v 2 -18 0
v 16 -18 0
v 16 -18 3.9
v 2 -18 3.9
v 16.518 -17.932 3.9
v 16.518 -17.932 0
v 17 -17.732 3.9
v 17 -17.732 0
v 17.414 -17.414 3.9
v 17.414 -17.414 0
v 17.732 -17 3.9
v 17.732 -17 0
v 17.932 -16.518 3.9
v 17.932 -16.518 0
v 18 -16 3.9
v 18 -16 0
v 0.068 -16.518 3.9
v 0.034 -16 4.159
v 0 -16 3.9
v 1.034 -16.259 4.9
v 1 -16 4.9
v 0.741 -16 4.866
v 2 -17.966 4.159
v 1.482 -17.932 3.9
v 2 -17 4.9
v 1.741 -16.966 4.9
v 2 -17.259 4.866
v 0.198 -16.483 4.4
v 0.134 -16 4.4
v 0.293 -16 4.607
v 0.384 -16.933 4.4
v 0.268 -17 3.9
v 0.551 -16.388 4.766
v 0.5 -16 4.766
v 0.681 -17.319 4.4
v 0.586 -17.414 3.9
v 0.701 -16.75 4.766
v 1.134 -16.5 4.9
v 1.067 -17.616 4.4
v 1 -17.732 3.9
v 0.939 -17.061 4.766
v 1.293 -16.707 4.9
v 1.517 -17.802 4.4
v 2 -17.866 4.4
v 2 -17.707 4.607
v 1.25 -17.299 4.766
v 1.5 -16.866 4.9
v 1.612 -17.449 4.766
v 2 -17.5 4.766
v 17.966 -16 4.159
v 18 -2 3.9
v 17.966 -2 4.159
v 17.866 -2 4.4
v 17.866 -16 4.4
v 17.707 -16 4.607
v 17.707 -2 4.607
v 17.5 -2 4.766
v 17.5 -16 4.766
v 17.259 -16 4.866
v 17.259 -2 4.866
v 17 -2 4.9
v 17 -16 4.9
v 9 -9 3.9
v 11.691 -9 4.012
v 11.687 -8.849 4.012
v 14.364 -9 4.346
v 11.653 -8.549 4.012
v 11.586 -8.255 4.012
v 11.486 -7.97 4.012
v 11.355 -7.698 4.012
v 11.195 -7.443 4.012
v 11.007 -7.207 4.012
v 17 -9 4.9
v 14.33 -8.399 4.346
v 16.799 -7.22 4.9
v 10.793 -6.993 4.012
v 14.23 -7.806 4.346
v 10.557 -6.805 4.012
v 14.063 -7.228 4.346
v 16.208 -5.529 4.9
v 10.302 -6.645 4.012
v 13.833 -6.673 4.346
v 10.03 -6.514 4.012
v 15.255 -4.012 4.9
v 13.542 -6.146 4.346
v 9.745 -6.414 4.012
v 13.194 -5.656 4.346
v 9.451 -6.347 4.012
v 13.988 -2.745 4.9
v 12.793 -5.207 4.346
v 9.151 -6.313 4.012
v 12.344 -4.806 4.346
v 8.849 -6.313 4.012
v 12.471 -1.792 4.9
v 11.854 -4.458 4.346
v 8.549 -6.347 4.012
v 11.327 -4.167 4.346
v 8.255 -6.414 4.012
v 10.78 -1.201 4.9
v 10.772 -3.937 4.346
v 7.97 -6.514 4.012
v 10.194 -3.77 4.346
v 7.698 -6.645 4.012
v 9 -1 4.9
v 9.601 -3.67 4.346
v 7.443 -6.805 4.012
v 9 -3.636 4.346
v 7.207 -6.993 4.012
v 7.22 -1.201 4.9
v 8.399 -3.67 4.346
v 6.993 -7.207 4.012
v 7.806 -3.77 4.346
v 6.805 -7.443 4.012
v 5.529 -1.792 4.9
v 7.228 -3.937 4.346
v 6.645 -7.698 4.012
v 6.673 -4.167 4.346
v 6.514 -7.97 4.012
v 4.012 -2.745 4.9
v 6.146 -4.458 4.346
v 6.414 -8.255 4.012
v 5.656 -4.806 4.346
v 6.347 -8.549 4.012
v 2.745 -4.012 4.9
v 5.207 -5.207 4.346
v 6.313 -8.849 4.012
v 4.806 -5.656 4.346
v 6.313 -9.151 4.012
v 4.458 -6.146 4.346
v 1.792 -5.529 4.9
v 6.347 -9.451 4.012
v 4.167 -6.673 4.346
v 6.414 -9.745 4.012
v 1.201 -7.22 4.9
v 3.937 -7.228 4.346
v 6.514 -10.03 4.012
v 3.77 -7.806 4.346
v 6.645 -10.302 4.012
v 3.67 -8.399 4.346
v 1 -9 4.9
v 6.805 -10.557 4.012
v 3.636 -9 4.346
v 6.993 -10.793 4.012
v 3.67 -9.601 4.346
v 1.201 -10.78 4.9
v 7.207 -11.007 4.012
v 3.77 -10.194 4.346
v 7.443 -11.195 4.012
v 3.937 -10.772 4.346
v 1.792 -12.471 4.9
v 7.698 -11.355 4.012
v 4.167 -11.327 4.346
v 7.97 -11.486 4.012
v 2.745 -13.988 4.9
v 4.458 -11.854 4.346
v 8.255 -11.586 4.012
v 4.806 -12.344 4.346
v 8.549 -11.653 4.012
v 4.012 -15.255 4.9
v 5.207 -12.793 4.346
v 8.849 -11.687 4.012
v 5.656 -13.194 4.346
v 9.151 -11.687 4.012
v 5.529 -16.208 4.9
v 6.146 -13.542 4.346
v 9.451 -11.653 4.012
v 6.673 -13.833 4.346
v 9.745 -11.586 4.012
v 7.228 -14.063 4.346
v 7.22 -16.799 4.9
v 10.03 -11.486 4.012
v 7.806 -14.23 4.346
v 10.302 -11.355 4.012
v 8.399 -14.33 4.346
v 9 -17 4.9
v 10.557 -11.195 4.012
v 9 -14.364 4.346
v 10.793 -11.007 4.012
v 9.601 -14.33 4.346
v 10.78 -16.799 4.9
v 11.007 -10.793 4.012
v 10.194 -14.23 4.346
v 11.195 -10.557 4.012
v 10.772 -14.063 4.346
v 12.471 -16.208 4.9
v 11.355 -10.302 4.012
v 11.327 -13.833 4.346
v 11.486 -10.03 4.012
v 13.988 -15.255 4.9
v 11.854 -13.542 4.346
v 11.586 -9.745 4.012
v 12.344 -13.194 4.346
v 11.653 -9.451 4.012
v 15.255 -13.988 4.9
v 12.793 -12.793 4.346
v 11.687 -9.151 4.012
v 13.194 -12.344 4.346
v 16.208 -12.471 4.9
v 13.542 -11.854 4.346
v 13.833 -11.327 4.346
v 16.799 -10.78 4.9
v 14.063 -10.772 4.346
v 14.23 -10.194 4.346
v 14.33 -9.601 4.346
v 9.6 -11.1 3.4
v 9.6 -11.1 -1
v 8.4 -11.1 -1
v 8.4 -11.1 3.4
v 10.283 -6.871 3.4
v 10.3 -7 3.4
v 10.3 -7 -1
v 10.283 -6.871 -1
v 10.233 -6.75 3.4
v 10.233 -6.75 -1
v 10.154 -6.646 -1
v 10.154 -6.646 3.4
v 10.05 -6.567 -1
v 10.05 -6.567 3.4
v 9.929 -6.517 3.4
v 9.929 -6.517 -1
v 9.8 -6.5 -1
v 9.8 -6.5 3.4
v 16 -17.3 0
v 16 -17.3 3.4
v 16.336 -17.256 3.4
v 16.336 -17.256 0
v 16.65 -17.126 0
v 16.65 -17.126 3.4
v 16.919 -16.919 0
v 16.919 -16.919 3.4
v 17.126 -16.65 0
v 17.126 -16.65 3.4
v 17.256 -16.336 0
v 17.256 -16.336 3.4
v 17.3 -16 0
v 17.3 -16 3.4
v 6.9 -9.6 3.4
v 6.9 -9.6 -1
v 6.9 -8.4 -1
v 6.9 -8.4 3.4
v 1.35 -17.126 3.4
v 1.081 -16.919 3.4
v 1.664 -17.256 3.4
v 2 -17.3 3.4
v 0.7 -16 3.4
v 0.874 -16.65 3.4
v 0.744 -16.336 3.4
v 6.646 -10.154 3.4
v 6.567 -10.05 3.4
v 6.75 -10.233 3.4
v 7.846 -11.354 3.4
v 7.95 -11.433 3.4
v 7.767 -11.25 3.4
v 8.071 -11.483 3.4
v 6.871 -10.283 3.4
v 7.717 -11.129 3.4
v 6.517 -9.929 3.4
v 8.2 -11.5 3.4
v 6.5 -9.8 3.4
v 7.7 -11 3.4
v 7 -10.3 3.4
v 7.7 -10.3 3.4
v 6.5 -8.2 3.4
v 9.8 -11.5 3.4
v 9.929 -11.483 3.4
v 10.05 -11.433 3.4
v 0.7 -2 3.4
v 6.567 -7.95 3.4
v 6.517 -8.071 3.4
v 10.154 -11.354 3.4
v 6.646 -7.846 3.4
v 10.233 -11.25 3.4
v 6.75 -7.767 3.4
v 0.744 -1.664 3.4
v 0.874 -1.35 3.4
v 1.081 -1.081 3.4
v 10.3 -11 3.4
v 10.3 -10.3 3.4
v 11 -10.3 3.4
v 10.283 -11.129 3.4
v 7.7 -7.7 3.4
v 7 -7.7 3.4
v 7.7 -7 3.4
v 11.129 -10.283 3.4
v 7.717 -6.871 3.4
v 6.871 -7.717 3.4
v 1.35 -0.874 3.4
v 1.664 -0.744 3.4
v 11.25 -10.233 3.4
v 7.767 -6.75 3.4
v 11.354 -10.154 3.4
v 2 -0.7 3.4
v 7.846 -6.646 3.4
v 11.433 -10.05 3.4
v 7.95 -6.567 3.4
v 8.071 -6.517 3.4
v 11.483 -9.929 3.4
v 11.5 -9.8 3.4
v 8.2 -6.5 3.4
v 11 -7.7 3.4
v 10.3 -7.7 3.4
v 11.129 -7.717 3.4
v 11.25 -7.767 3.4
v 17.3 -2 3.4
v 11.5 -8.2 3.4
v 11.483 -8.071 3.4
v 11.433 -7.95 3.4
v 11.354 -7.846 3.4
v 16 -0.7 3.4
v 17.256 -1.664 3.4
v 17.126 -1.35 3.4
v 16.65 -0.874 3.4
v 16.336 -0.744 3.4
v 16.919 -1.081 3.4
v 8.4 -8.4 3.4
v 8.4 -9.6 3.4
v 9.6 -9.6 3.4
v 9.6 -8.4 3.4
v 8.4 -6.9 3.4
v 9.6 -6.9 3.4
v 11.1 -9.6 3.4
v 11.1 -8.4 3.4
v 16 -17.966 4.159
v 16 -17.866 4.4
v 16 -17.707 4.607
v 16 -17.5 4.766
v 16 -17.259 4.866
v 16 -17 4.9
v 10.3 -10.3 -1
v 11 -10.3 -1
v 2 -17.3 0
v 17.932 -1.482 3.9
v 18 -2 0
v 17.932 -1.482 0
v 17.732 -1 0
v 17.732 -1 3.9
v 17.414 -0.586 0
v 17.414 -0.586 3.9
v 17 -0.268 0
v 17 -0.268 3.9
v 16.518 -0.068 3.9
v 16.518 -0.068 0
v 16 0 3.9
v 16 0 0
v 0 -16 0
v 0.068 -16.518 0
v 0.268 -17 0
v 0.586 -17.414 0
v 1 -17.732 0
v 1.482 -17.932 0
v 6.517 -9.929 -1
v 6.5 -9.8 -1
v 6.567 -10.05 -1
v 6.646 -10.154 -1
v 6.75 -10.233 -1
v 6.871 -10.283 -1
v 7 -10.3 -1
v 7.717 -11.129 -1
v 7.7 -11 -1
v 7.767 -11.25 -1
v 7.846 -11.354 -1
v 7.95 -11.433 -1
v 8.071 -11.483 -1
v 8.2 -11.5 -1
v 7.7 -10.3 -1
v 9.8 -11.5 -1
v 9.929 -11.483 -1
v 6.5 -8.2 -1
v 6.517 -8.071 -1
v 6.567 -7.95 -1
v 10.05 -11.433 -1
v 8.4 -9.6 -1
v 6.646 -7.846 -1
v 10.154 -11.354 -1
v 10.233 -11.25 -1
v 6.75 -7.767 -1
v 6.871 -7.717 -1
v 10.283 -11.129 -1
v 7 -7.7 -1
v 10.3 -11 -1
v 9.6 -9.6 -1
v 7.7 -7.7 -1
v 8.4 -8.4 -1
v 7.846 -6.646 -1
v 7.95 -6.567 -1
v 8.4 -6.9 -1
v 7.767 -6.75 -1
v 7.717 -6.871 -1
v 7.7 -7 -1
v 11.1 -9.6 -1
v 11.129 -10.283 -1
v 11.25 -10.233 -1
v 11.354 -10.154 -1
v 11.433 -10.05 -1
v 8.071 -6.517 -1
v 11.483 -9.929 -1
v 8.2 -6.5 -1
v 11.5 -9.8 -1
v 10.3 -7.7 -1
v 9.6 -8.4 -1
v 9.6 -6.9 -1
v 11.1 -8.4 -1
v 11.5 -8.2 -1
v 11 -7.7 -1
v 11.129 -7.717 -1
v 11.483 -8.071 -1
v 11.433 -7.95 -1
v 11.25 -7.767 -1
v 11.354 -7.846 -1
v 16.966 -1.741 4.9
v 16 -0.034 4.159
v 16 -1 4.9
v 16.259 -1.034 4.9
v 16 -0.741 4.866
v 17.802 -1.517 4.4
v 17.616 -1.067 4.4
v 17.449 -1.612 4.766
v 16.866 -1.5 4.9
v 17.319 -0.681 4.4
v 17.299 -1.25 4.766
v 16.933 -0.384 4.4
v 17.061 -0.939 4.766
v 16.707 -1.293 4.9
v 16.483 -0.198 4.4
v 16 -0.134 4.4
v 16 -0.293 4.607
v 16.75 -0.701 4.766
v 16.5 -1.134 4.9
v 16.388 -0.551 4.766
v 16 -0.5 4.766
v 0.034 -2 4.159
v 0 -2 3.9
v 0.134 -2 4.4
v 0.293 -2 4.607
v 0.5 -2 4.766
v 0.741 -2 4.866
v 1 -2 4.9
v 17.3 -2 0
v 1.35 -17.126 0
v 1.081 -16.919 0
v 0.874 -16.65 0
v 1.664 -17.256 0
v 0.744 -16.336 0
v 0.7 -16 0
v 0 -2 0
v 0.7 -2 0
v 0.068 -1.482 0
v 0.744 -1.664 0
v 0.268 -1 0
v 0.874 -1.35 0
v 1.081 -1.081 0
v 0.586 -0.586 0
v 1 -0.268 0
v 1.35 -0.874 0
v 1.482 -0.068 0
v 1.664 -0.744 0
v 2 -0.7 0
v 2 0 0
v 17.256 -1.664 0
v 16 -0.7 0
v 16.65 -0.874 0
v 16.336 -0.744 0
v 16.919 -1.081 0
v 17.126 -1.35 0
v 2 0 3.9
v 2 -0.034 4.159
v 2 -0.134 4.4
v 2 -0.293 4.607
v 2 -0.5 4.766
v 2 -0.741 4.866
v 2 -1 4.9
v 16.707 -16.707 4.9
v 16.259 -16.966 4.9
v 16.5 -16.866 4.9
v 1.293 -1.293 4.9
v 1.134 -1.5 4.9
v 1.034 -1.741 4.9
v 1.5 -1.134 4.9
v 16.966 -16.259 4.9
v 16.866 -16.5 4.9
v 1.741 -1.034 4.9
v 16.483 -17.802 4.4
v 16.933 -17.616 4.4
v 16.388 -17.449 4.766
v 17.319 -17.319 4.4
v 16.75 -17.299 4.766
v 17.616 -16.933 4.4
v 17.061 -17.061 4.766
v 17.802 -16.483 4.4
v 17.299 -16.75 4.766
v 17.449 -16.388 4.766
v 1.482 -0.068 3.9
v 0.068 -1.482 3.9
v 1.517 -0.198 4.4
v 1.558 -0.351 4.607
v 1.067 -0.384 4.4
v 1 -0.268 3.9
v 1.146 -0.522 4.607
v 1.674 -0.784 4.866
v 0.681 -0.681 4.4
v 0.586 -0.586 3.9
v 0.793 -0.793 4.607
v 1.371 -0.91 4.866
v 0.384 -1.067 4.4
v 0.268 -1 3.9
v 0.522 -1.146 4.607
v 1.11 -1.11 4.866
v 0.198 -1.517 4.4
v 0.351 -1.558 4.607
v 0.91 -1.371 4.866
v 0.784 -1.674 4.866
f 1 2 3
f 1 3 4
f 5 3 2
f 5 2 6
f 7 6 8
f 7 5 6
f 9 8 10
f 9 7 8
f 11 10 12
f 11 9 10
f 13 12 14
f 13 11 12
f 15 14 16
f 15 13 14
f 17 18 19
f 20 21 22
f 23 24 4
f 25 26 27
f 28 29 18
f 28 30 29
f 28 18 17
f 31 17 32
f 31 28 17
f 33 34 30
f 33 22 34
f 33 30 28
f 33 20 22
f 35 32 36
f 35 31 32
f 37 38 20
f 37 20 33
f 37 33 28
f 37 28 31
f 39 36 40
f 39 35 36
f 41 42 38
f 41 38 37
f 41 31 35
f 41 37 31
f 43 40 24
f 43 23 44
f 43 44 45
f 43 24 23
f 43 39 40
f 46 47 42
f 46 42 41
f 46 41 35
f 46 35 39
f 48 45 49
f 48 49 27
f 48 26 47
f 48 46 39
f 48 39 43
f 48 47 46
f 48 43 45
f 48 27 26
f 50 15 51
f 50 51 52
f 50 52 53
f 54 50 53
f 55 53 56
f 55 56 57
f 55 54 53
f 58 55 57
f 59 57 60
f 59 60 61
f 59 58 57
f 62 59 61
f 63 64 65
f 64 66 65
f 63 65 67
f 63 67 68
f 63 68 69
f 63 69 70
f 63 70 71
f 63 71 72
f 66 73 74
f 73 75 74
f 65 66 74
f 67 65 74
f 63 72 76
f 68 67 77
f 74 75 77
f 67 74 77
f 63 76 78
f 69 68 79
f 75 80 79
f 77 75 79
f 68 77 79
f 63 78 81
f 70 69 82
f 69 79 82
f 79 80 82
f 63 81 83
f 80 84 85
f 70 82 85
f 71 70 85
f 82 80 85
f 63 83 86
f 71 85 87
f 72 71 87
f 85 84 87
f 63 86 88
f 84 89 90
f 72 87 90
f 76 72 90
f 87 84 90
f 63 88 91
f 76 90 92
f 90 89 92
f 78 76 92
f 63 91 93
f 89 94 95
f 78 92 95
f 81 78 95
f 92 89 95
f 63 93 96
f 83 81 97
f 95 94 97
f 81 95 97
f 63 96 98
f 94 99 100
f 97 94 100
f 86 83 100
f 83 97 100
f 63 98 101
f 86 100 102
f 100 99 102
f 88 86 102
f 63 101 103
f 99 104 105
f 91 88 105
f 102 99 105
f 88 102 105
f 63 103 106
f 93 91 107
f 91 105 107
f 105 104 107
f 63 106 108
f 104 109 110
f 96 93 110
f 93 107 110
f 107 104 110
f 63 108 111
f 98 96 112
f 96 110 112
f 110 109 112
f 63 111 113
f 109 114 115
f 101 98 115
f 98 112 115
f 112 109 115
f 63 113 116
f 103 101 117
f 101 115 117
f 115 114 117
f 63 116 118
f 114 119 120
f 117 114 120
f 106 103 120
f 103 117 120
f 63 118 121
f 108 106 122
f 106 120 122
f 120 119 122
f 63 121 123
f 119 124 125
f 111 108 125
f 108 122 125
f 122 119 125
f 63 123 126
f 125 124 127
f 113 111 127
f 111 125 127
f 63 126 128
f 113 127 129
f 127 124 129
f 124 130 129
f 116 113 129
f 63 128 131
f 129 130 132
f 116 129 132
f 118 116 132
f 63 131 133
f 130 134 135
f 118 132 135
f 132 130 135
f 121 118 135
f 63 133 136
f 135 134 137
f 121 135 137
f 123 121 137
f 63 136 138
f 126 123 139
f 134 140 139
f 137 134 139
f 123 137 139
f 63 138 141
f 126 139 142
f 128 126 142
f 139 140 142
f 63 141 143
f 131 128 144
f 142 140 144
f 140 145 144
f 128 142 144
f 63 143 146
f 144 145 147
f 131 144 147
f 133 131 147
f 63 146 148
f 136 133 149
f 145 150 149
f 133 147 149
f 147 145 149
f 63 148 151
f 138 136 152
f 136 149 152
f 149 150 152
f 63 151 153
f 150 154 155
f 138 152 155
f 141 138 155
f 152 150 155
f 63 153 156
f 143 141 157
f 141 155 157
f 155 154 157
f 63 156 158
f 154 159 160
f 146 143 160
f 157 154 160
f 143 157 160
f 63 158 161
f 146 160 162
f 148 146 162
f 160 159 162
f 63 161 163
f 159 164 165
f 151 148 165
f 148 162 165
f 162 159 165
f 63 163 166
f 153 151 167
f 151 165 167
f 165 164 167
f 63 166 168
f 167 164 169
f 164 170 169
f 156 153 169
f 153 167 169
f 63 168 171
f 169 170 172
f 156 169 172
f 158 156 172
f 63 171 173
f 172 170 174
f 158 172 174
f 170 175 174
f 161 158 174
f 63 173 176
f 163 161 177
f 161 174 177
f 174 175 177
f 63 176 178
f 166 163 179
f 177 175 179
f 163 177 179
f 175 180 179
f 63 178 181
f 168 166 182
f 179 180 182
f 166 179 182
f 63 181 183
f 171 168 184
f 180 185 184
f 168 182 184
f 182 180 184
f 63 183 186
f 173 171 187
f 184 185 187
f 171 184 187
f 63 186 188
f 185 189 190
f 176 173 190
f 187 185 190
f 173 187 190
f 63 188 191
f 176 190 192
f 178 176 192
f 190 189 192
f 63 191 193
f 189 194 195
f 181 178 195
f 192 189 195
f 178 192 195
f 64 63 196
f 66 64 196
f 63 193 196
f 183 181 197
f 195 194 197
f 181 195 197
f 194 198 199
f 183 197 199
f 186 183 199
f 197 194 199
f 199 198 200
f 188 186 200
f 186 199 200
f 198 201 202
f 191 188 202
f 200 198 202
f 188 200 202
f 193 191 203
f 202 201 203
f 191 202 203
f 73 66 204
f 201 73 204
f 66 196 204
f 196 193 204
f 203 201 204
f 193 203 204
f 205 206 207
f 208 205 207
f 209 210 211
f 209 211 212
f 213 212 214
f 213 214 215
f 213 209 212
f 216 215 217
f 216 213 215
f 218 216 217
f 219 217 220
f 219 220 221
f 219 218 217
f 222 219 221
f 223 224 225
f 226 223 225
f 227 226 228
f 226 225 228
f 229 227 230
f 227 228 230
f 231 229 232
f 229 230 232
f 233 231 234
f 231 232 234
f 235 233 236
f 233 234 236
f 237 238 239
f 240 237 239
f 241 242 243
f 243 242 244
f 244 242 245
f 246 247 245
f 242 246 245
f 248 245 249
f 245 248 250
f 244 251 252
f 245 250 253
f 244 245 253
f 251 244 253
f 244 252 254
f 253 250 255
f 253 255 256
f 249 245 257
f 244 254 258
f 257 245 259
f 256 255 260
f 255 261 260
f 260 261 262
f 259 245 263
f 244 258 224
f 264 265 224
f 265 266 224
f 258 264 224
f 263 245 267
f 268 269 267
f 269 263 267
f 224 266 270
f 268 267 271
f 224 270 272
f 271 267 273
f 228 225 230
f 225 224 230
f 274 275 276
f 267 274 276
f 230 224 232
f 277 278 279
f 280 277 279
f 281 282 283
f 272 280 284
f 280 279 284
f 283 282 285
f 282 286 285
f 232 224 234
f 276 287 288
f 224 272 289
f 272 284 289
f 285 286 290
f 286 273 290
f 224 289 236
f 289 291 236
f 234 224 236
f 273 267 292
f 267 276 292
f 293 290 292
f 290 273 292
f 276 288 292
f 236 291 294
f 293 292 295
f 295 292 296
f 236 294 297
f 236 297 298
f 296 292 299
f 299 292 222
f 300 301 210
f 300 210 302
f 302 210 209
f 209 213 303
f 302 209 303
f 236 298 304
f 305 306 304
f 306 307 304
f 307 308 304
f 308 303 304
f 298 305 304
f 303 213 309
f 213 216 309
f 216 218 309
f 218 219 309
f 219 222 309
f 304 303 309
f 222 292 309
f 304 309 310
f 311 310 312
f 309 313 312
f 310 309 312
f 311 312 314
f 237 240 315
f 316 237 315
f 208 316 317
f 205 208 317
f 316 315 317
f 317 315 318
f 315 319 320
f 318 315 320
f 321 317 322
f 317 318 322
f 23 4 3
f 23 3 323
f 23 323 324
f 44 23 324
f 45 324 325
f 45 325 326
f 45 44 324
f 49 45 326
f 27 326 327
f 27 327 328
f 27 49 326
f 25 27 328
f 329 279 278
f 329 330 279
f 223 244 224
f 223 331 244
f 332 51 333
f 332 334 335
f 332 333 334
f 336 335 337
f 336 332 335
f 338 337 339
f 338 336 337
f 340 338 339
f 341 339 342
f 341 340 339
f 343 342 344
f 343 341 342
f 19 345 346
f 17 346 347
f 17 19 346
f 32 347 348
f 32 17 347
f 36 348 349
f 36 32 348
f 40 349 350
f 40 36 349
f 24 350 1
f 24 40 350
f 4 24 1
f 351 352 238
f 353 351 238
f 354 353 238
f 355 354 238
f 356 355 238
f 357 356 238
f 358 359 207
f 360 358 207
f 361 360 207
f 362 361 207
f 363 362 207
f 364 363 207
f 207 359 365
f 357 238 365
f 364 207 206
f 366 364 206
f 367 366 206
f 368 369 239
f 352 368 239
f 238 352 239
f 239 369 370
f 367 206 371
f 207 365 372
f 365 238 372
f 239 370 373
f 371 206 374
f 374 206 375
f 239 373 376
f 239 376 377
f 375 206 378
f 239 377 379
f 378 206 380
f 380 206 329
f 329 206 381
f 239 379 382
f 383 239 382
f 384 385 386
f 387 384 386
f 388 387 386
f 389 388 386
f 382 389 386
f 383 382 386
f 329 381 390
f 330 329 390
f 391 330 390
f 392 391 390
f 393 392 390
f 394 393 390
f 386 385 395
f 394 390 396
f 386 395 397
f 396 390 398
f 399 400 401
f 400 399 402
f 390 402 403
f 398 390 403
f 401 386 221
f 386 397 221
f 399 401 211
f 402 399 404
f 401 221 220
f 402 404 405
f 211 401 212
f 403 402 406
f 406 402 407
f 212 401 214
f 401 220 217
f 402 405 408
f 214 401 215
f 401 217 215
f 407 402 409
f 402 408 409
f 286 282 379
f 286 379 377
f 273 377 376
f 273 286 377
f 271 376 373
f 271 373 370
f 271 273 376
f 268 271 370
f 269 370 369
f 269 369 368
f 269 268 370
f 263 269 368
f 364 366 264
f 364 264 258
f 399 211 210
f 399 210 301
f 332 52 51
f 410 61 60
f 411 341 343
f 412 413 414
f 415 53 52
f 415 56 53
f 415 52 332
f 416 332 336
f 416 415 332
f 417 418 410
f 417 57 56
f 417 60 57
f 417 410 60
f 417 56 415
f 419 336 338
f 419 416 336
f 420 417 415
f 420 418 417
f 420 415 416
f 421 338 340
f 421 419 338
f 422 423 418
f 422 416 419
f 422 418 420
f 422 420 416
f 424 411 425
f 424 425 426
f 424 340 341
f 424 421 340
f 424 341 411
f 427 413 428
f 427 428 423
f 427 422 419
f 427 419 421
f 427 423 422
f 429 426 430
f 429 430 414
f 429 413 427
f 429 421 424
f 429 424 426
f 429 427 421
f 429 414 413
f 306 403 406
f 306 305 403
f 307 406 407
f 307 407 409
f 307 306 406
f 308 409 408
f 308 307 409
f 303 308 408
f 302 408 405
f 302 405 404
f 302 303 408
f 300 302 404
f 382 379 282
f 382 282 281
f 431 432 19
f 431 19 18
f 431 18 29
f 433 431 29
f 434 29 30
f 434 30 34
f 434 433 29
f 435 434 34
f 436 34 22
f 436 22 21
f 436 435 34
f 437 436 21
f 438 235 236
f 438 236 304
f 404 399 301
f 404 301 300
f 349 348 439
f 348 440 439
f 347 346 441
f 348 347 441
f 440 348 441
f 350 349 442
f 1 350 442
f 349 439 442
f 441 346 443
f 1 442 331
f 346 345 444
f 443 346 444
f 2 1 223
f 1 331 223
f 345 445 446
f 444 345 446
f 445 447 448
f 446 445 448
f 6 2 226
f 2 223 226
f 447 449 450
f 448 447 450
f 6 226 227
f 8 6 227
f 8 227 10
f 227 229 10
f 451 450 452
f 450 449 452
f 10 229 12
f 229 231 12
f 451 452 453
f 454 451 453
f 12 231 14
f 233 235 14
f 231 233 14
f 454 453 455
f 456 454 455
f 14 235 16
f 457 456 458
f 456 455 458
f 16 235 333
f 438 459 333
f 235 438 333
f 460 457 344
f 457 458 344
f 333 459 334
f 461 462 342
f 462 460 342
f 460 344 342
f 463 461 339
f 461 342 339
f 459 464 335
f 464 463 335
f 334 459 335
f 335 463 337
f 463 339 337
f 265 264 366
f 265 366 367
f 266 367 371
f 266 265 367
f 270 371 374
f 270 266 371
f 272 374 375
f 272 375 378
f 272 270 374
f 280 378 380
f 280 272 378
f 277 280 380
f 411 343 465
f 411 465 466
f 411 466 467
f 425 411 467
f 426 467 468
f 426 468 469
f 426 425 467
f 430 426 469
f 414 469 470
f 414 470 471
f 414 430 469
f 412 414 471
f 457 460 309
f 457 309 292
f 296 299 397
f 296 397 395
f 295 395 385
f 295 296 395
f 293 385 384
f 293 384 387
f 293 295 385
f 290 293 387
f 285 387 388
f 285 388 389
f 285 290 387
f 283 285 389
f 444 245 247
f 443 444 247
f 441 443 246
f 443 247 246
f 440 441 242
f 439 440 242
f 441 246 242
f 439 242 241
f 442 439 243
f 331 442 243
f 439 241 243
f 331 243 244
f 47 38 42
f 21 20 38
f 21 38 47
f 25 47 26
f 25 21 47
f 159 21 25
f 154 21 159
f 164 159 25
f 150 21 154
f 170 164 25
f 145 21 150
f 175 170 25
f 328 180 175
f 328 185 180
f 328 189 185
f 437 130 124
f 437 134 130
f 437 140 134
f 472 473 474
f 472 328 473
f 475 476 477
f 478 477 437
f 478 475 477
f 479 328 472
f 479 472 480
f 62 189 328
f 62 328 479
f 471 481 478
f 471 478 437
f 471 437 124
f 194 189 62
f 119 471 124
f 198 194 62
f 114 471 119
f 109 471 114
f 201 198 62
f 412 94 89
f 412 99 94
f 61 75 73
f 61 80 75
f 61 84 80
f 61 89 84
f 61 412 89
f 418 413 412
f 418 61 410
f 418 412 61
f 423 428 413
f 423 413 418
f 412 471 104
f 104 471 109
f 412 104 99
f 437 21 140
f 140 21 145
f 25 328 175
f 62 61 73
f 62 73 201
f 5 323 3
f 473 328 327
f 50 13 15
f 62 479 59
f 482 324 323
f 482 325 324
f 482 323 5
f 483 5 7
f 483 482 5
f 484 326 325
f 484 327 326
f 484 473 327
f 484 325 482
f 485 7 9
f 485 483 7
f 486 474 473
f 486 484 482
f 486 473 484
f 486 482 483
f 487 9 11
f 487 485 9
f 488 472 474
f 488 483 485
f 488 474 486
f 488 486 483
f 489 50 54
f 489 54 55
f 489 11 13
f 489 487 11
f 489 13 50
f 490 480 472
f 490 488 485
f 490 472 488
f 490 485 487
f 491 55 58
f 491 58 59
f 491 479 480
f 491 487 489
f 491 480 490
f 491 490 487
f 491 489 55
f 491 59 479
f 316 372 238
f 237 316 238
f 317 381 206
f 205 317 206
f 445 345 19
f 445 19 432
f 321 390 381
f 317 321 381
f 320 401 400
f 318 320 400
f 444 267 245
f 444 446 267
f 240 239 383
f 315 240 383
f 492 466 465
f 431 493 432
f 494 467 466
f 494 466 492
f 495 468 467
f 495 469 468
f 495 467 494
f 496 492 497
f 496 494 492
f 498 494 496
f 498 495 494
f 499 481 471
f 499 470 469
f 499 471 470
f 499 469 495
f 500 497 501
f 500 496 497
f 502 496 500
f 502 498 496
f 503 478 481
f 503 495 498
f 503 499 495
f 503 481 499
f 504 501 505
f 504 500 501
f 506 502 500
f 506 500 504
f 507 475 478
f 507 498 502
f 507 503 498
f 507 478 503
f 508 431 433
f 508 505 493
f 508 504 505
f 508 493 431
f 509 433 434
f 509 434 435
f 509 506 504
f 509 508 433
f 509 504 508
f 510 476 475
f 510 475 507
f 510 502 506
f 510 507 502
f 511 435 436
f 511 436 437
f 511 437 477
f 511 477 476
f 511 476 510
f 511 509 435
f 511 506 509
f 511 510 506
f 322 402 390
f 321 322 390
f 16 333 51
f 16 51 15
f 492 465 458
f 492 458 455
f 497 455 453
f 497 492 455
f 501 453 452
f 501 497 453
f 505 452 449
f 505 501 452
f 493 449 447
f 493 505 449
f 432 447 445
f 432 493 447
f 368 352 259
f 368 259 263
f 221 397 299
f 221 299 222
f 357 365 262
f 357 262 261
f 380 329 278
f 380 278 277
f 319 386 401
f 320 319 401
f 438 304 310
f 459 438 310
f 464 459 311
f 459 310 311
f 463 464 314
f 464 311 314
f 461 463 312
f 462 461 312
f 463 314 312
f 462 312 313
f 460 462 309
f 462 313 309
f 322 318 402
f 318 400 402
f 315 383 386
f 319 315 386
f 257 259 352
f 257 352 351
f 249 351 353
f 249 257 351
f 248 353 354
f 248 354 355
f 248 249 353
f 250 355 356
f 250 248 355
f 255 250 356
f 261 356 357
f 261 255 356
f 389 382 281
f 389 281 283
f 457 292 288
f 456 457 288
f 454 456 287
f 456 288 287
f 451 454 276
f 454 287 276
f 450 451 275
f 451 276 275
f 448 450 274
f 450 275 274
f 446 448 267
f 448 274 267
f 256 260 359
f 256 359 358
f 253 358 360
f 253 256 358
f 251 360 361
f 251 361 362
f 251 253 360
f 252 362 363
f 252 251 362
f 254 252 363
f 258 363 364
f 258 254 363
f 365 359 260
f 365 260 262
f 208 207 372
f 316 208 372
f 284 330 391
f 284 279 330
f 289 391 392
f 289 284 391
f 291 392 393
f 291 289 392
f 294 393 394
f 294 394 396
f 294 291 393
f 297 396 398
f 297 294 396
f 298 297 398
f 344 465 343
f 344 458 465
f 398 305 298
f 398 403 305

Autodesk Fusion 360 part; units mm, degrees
sketch "Sketch1" plane through (0, 0, 0) normal (0, 0, 1) x (1, 0, 0)
  line L0 (0, 0) -> (18, 0)
  line L1 (18, 0) -> (18, -18)
  line L2 (18, -18) -> (0, -18)
  line L3 (0, -18) -> (0, 0)
  line L4 (11.5, -10.3) -> (6.5, -10.3)
  line L5 (6.5, -10.3) -> (6.5, -7.7)
  line L6 (6.5, -7.7) -> (11.5, -7.7)
  line L7 (11.5, -7.7) -> (11.5, -10.3)
  line L8 (11.5, -10.3) -> (6.5, -7.7) construction
  line L9 (6.5, -10.3) -> (11.5, -7.7) construction
  line L10 (11.1, -9.6) -> (6.9, -9.6)
  line L11 (6.9, -9.6) -> (6.9, -8.4)
  line L12 (6.9, -8.4) -> (11.1, -8.4)
  line L13 (11.1, -8.4) -> (11.1, -9.6)
  line L14 (11.1, -9.6) -> (6.9, -8.4) construction
  line L15 (6.9, -9.6) -> (11.1, -8.4) construction
  line L16 (7.7, -6.5) -> (10.3, -11.5) construction
  line L17 (8.4, -11.1) -> (9.6, -6.9) construction
  line L18 (7.7, -11.5) -> (10.3, -6.5) construction
  line L19 (7.7, -6.5) -> (10.3, -6.5)
  line L20 (8.4, -11.1) -> (8.4, -6.9)
  line L21 (7.7, -11.5) -> (7.7, -6.5)
  line L22 (8.4, -6.9) -> (9.6, -11.1) construction
  line L23 (10.3, -6.5) -> (10.3, -11.5)
  line L24 (10.3, -11.5) -> (7.7, -11.5)
  line L25 (9.6, -6.9) -> (9.6, -11.1)
  line L26 (9.6, -11.1) -> (8.4, -11.1)
  line L27 (8.4, -6.9) -> (9.6, -6.9)
  line L28 (17.3, -0.7) -> (0.7, -0.7)
  line L29 (0.7, -0.7) -> (0.7, -17.3)
  line L30 (0.7, -17.3) -> (17.3, -17.3)
  line L31 (17.3, -17.3) -> (17.3, -0.7)
  line L32 (17.3, -0.7) -> (0.7, -17.3) construction
  line L33 (0.7, -0.7) -> (17.3, -17.3) construction
  point P0 (9, -9)
  point P1 (9, -9)
  point P2 (9, -9)
  point P3 (9, -9)
  point P4 (9, -9)
  dimension "d1" = 18
  dimension "d2" = 18
  dimension "d9" = 5
  dimension "d10" = 2.6
  dimension "d11" = 4.2
  dimension "d12" = 1.2
  dimension "d13" = 5
  dimension "d14" = 2.6
  dimension "d15" = 4.2
  dimension "d16" = 1.2
  dimension "d21" = 16.6
  dimension "d22" = 16.6
extrude "Extrude1" add sketch "Sketch1" along normal blind 4.9 contours L0 L1 L2 L3 | L4 L6 L7 L10 L12 L13 L23 | L4 L20 L21 L23 L24 L25 L26 | L4 L10 L23 L25 | L4 L20 L25 L26 | L4 L10 L20 L25 | L10 L12 L13 L23 | L10 L12 L23 L25 | L6 L12 L23 L25 | L6 L19 L20 L21 L23 L25 L27 | L4 L10 L20 L21 | L10 L12 L20 L25 | L6 L12 L20 L25 | L6 L20 L25 L27 | L4 L5 L6 L10 L11 L12 L21 | L10 L12 L20 L21 | L6 L12 L20 L21 | L10 L11 L12 L21 | L28 L29 L30 L31
fillet "Fillet1" radius 2 4 edges at (18, -18, 2.45) (18, 0, 2.45) (0, 0, 2.45) (0, -18, 2.45)
extrude "Extrude2" cut sketch "Sketch1" along normal blind 3.4 contours L4 L6 L7 L10 L12 L13 L23 | L4 L20 L21 L23 L24 L25 L26 | L4 L10 L23 L25 | L4 L20 L25 L26 | L4 L10 L20 L25 | L10 L12 L13 L23 | L10 L12 L23 L25 | L6 L12 L23 L25 | L6 L19 L20 L21 L23 L25 L27 | L4 L10 L20 L21 | L10 L12 L20 L25 | L6 L12 L20 L25 | L6 L20 L25 L27 | L4 L5 L6 L10 L11 L12 L21 | L10 L12 L20 L21 | L6 L12 L20 L21 | L10 L11 L12 L21 | L28 L29 L30 L31
fillet "Fillet2" radius 1.3 4 edges at (17.3, -17.3, 1.7) (0.7, -17.3, 1.7) (0.7, -0.7, 1.7) (17.3, -0.7, 1.7)
extrude "Extrude3" add sketch "Sketch1" along normal blind 5 from surface at -1 contours L4 L6 L7 L10 L12 L13 L23 | L4 L20 L21 L23 L24 L25 L26 | L4 L10 L23 L25 | L6 L12 L23 L25 | L6 L19 L20 L21 L23 L25 L27 | L4 L10 L20 L21 | L4 L5 L6 L10 L11 L12 L21 | L6 L12 L20 L21
fillet "Fillet3" radius 0.5 8 edges at (10.3, -11.5, 1.2) (11.5, -10.3, 1.2) (11.5, -7.7, 1.2) (10.3, -6.5, 1.2) (7.7, -6.5, 1.2) (6.5, -7.7, 1.2) (6.5, -10.3, 1.2) (7.7, -11.5, 1.2)
ref_plane "WorkPlane1" through (0, 0, 36.4) normal (0, 0, 1) x (1, 0, 0)
sketch "Sketch2" plane through (0, 0, 36.4) normal (0, 0, 1) x (1, 0, 0)
  point P0 (9, -9)
sphere "SpherePrimitive1" cut diameter 65 placed x (1, 0, 0) y (0, 1, 0) z (0, 0, 1) at (9, -9, 36.4)
fillet "Fillet4" radius 1 8 edges at (17.4142, -17.4142, 4.9) (18, -9, 4.9) (17.4142, -0.5858, 4.9) (9, 0, 4.9) (0.5858, -0.5858, 4.9) (0, -9, 4.9) (0.5858, -17.4142, 4.9) (9, -18, 4.9)
equation "d21 = 18 mm - 1.4 mm"
equation "d22 = 18 mm - 1.4 mm"
equation "d23 = 4.9 mm - ( 4.9 mm - 3.4 mm )"
equation "d32 = 31.5 mm + 4.9 mm"
